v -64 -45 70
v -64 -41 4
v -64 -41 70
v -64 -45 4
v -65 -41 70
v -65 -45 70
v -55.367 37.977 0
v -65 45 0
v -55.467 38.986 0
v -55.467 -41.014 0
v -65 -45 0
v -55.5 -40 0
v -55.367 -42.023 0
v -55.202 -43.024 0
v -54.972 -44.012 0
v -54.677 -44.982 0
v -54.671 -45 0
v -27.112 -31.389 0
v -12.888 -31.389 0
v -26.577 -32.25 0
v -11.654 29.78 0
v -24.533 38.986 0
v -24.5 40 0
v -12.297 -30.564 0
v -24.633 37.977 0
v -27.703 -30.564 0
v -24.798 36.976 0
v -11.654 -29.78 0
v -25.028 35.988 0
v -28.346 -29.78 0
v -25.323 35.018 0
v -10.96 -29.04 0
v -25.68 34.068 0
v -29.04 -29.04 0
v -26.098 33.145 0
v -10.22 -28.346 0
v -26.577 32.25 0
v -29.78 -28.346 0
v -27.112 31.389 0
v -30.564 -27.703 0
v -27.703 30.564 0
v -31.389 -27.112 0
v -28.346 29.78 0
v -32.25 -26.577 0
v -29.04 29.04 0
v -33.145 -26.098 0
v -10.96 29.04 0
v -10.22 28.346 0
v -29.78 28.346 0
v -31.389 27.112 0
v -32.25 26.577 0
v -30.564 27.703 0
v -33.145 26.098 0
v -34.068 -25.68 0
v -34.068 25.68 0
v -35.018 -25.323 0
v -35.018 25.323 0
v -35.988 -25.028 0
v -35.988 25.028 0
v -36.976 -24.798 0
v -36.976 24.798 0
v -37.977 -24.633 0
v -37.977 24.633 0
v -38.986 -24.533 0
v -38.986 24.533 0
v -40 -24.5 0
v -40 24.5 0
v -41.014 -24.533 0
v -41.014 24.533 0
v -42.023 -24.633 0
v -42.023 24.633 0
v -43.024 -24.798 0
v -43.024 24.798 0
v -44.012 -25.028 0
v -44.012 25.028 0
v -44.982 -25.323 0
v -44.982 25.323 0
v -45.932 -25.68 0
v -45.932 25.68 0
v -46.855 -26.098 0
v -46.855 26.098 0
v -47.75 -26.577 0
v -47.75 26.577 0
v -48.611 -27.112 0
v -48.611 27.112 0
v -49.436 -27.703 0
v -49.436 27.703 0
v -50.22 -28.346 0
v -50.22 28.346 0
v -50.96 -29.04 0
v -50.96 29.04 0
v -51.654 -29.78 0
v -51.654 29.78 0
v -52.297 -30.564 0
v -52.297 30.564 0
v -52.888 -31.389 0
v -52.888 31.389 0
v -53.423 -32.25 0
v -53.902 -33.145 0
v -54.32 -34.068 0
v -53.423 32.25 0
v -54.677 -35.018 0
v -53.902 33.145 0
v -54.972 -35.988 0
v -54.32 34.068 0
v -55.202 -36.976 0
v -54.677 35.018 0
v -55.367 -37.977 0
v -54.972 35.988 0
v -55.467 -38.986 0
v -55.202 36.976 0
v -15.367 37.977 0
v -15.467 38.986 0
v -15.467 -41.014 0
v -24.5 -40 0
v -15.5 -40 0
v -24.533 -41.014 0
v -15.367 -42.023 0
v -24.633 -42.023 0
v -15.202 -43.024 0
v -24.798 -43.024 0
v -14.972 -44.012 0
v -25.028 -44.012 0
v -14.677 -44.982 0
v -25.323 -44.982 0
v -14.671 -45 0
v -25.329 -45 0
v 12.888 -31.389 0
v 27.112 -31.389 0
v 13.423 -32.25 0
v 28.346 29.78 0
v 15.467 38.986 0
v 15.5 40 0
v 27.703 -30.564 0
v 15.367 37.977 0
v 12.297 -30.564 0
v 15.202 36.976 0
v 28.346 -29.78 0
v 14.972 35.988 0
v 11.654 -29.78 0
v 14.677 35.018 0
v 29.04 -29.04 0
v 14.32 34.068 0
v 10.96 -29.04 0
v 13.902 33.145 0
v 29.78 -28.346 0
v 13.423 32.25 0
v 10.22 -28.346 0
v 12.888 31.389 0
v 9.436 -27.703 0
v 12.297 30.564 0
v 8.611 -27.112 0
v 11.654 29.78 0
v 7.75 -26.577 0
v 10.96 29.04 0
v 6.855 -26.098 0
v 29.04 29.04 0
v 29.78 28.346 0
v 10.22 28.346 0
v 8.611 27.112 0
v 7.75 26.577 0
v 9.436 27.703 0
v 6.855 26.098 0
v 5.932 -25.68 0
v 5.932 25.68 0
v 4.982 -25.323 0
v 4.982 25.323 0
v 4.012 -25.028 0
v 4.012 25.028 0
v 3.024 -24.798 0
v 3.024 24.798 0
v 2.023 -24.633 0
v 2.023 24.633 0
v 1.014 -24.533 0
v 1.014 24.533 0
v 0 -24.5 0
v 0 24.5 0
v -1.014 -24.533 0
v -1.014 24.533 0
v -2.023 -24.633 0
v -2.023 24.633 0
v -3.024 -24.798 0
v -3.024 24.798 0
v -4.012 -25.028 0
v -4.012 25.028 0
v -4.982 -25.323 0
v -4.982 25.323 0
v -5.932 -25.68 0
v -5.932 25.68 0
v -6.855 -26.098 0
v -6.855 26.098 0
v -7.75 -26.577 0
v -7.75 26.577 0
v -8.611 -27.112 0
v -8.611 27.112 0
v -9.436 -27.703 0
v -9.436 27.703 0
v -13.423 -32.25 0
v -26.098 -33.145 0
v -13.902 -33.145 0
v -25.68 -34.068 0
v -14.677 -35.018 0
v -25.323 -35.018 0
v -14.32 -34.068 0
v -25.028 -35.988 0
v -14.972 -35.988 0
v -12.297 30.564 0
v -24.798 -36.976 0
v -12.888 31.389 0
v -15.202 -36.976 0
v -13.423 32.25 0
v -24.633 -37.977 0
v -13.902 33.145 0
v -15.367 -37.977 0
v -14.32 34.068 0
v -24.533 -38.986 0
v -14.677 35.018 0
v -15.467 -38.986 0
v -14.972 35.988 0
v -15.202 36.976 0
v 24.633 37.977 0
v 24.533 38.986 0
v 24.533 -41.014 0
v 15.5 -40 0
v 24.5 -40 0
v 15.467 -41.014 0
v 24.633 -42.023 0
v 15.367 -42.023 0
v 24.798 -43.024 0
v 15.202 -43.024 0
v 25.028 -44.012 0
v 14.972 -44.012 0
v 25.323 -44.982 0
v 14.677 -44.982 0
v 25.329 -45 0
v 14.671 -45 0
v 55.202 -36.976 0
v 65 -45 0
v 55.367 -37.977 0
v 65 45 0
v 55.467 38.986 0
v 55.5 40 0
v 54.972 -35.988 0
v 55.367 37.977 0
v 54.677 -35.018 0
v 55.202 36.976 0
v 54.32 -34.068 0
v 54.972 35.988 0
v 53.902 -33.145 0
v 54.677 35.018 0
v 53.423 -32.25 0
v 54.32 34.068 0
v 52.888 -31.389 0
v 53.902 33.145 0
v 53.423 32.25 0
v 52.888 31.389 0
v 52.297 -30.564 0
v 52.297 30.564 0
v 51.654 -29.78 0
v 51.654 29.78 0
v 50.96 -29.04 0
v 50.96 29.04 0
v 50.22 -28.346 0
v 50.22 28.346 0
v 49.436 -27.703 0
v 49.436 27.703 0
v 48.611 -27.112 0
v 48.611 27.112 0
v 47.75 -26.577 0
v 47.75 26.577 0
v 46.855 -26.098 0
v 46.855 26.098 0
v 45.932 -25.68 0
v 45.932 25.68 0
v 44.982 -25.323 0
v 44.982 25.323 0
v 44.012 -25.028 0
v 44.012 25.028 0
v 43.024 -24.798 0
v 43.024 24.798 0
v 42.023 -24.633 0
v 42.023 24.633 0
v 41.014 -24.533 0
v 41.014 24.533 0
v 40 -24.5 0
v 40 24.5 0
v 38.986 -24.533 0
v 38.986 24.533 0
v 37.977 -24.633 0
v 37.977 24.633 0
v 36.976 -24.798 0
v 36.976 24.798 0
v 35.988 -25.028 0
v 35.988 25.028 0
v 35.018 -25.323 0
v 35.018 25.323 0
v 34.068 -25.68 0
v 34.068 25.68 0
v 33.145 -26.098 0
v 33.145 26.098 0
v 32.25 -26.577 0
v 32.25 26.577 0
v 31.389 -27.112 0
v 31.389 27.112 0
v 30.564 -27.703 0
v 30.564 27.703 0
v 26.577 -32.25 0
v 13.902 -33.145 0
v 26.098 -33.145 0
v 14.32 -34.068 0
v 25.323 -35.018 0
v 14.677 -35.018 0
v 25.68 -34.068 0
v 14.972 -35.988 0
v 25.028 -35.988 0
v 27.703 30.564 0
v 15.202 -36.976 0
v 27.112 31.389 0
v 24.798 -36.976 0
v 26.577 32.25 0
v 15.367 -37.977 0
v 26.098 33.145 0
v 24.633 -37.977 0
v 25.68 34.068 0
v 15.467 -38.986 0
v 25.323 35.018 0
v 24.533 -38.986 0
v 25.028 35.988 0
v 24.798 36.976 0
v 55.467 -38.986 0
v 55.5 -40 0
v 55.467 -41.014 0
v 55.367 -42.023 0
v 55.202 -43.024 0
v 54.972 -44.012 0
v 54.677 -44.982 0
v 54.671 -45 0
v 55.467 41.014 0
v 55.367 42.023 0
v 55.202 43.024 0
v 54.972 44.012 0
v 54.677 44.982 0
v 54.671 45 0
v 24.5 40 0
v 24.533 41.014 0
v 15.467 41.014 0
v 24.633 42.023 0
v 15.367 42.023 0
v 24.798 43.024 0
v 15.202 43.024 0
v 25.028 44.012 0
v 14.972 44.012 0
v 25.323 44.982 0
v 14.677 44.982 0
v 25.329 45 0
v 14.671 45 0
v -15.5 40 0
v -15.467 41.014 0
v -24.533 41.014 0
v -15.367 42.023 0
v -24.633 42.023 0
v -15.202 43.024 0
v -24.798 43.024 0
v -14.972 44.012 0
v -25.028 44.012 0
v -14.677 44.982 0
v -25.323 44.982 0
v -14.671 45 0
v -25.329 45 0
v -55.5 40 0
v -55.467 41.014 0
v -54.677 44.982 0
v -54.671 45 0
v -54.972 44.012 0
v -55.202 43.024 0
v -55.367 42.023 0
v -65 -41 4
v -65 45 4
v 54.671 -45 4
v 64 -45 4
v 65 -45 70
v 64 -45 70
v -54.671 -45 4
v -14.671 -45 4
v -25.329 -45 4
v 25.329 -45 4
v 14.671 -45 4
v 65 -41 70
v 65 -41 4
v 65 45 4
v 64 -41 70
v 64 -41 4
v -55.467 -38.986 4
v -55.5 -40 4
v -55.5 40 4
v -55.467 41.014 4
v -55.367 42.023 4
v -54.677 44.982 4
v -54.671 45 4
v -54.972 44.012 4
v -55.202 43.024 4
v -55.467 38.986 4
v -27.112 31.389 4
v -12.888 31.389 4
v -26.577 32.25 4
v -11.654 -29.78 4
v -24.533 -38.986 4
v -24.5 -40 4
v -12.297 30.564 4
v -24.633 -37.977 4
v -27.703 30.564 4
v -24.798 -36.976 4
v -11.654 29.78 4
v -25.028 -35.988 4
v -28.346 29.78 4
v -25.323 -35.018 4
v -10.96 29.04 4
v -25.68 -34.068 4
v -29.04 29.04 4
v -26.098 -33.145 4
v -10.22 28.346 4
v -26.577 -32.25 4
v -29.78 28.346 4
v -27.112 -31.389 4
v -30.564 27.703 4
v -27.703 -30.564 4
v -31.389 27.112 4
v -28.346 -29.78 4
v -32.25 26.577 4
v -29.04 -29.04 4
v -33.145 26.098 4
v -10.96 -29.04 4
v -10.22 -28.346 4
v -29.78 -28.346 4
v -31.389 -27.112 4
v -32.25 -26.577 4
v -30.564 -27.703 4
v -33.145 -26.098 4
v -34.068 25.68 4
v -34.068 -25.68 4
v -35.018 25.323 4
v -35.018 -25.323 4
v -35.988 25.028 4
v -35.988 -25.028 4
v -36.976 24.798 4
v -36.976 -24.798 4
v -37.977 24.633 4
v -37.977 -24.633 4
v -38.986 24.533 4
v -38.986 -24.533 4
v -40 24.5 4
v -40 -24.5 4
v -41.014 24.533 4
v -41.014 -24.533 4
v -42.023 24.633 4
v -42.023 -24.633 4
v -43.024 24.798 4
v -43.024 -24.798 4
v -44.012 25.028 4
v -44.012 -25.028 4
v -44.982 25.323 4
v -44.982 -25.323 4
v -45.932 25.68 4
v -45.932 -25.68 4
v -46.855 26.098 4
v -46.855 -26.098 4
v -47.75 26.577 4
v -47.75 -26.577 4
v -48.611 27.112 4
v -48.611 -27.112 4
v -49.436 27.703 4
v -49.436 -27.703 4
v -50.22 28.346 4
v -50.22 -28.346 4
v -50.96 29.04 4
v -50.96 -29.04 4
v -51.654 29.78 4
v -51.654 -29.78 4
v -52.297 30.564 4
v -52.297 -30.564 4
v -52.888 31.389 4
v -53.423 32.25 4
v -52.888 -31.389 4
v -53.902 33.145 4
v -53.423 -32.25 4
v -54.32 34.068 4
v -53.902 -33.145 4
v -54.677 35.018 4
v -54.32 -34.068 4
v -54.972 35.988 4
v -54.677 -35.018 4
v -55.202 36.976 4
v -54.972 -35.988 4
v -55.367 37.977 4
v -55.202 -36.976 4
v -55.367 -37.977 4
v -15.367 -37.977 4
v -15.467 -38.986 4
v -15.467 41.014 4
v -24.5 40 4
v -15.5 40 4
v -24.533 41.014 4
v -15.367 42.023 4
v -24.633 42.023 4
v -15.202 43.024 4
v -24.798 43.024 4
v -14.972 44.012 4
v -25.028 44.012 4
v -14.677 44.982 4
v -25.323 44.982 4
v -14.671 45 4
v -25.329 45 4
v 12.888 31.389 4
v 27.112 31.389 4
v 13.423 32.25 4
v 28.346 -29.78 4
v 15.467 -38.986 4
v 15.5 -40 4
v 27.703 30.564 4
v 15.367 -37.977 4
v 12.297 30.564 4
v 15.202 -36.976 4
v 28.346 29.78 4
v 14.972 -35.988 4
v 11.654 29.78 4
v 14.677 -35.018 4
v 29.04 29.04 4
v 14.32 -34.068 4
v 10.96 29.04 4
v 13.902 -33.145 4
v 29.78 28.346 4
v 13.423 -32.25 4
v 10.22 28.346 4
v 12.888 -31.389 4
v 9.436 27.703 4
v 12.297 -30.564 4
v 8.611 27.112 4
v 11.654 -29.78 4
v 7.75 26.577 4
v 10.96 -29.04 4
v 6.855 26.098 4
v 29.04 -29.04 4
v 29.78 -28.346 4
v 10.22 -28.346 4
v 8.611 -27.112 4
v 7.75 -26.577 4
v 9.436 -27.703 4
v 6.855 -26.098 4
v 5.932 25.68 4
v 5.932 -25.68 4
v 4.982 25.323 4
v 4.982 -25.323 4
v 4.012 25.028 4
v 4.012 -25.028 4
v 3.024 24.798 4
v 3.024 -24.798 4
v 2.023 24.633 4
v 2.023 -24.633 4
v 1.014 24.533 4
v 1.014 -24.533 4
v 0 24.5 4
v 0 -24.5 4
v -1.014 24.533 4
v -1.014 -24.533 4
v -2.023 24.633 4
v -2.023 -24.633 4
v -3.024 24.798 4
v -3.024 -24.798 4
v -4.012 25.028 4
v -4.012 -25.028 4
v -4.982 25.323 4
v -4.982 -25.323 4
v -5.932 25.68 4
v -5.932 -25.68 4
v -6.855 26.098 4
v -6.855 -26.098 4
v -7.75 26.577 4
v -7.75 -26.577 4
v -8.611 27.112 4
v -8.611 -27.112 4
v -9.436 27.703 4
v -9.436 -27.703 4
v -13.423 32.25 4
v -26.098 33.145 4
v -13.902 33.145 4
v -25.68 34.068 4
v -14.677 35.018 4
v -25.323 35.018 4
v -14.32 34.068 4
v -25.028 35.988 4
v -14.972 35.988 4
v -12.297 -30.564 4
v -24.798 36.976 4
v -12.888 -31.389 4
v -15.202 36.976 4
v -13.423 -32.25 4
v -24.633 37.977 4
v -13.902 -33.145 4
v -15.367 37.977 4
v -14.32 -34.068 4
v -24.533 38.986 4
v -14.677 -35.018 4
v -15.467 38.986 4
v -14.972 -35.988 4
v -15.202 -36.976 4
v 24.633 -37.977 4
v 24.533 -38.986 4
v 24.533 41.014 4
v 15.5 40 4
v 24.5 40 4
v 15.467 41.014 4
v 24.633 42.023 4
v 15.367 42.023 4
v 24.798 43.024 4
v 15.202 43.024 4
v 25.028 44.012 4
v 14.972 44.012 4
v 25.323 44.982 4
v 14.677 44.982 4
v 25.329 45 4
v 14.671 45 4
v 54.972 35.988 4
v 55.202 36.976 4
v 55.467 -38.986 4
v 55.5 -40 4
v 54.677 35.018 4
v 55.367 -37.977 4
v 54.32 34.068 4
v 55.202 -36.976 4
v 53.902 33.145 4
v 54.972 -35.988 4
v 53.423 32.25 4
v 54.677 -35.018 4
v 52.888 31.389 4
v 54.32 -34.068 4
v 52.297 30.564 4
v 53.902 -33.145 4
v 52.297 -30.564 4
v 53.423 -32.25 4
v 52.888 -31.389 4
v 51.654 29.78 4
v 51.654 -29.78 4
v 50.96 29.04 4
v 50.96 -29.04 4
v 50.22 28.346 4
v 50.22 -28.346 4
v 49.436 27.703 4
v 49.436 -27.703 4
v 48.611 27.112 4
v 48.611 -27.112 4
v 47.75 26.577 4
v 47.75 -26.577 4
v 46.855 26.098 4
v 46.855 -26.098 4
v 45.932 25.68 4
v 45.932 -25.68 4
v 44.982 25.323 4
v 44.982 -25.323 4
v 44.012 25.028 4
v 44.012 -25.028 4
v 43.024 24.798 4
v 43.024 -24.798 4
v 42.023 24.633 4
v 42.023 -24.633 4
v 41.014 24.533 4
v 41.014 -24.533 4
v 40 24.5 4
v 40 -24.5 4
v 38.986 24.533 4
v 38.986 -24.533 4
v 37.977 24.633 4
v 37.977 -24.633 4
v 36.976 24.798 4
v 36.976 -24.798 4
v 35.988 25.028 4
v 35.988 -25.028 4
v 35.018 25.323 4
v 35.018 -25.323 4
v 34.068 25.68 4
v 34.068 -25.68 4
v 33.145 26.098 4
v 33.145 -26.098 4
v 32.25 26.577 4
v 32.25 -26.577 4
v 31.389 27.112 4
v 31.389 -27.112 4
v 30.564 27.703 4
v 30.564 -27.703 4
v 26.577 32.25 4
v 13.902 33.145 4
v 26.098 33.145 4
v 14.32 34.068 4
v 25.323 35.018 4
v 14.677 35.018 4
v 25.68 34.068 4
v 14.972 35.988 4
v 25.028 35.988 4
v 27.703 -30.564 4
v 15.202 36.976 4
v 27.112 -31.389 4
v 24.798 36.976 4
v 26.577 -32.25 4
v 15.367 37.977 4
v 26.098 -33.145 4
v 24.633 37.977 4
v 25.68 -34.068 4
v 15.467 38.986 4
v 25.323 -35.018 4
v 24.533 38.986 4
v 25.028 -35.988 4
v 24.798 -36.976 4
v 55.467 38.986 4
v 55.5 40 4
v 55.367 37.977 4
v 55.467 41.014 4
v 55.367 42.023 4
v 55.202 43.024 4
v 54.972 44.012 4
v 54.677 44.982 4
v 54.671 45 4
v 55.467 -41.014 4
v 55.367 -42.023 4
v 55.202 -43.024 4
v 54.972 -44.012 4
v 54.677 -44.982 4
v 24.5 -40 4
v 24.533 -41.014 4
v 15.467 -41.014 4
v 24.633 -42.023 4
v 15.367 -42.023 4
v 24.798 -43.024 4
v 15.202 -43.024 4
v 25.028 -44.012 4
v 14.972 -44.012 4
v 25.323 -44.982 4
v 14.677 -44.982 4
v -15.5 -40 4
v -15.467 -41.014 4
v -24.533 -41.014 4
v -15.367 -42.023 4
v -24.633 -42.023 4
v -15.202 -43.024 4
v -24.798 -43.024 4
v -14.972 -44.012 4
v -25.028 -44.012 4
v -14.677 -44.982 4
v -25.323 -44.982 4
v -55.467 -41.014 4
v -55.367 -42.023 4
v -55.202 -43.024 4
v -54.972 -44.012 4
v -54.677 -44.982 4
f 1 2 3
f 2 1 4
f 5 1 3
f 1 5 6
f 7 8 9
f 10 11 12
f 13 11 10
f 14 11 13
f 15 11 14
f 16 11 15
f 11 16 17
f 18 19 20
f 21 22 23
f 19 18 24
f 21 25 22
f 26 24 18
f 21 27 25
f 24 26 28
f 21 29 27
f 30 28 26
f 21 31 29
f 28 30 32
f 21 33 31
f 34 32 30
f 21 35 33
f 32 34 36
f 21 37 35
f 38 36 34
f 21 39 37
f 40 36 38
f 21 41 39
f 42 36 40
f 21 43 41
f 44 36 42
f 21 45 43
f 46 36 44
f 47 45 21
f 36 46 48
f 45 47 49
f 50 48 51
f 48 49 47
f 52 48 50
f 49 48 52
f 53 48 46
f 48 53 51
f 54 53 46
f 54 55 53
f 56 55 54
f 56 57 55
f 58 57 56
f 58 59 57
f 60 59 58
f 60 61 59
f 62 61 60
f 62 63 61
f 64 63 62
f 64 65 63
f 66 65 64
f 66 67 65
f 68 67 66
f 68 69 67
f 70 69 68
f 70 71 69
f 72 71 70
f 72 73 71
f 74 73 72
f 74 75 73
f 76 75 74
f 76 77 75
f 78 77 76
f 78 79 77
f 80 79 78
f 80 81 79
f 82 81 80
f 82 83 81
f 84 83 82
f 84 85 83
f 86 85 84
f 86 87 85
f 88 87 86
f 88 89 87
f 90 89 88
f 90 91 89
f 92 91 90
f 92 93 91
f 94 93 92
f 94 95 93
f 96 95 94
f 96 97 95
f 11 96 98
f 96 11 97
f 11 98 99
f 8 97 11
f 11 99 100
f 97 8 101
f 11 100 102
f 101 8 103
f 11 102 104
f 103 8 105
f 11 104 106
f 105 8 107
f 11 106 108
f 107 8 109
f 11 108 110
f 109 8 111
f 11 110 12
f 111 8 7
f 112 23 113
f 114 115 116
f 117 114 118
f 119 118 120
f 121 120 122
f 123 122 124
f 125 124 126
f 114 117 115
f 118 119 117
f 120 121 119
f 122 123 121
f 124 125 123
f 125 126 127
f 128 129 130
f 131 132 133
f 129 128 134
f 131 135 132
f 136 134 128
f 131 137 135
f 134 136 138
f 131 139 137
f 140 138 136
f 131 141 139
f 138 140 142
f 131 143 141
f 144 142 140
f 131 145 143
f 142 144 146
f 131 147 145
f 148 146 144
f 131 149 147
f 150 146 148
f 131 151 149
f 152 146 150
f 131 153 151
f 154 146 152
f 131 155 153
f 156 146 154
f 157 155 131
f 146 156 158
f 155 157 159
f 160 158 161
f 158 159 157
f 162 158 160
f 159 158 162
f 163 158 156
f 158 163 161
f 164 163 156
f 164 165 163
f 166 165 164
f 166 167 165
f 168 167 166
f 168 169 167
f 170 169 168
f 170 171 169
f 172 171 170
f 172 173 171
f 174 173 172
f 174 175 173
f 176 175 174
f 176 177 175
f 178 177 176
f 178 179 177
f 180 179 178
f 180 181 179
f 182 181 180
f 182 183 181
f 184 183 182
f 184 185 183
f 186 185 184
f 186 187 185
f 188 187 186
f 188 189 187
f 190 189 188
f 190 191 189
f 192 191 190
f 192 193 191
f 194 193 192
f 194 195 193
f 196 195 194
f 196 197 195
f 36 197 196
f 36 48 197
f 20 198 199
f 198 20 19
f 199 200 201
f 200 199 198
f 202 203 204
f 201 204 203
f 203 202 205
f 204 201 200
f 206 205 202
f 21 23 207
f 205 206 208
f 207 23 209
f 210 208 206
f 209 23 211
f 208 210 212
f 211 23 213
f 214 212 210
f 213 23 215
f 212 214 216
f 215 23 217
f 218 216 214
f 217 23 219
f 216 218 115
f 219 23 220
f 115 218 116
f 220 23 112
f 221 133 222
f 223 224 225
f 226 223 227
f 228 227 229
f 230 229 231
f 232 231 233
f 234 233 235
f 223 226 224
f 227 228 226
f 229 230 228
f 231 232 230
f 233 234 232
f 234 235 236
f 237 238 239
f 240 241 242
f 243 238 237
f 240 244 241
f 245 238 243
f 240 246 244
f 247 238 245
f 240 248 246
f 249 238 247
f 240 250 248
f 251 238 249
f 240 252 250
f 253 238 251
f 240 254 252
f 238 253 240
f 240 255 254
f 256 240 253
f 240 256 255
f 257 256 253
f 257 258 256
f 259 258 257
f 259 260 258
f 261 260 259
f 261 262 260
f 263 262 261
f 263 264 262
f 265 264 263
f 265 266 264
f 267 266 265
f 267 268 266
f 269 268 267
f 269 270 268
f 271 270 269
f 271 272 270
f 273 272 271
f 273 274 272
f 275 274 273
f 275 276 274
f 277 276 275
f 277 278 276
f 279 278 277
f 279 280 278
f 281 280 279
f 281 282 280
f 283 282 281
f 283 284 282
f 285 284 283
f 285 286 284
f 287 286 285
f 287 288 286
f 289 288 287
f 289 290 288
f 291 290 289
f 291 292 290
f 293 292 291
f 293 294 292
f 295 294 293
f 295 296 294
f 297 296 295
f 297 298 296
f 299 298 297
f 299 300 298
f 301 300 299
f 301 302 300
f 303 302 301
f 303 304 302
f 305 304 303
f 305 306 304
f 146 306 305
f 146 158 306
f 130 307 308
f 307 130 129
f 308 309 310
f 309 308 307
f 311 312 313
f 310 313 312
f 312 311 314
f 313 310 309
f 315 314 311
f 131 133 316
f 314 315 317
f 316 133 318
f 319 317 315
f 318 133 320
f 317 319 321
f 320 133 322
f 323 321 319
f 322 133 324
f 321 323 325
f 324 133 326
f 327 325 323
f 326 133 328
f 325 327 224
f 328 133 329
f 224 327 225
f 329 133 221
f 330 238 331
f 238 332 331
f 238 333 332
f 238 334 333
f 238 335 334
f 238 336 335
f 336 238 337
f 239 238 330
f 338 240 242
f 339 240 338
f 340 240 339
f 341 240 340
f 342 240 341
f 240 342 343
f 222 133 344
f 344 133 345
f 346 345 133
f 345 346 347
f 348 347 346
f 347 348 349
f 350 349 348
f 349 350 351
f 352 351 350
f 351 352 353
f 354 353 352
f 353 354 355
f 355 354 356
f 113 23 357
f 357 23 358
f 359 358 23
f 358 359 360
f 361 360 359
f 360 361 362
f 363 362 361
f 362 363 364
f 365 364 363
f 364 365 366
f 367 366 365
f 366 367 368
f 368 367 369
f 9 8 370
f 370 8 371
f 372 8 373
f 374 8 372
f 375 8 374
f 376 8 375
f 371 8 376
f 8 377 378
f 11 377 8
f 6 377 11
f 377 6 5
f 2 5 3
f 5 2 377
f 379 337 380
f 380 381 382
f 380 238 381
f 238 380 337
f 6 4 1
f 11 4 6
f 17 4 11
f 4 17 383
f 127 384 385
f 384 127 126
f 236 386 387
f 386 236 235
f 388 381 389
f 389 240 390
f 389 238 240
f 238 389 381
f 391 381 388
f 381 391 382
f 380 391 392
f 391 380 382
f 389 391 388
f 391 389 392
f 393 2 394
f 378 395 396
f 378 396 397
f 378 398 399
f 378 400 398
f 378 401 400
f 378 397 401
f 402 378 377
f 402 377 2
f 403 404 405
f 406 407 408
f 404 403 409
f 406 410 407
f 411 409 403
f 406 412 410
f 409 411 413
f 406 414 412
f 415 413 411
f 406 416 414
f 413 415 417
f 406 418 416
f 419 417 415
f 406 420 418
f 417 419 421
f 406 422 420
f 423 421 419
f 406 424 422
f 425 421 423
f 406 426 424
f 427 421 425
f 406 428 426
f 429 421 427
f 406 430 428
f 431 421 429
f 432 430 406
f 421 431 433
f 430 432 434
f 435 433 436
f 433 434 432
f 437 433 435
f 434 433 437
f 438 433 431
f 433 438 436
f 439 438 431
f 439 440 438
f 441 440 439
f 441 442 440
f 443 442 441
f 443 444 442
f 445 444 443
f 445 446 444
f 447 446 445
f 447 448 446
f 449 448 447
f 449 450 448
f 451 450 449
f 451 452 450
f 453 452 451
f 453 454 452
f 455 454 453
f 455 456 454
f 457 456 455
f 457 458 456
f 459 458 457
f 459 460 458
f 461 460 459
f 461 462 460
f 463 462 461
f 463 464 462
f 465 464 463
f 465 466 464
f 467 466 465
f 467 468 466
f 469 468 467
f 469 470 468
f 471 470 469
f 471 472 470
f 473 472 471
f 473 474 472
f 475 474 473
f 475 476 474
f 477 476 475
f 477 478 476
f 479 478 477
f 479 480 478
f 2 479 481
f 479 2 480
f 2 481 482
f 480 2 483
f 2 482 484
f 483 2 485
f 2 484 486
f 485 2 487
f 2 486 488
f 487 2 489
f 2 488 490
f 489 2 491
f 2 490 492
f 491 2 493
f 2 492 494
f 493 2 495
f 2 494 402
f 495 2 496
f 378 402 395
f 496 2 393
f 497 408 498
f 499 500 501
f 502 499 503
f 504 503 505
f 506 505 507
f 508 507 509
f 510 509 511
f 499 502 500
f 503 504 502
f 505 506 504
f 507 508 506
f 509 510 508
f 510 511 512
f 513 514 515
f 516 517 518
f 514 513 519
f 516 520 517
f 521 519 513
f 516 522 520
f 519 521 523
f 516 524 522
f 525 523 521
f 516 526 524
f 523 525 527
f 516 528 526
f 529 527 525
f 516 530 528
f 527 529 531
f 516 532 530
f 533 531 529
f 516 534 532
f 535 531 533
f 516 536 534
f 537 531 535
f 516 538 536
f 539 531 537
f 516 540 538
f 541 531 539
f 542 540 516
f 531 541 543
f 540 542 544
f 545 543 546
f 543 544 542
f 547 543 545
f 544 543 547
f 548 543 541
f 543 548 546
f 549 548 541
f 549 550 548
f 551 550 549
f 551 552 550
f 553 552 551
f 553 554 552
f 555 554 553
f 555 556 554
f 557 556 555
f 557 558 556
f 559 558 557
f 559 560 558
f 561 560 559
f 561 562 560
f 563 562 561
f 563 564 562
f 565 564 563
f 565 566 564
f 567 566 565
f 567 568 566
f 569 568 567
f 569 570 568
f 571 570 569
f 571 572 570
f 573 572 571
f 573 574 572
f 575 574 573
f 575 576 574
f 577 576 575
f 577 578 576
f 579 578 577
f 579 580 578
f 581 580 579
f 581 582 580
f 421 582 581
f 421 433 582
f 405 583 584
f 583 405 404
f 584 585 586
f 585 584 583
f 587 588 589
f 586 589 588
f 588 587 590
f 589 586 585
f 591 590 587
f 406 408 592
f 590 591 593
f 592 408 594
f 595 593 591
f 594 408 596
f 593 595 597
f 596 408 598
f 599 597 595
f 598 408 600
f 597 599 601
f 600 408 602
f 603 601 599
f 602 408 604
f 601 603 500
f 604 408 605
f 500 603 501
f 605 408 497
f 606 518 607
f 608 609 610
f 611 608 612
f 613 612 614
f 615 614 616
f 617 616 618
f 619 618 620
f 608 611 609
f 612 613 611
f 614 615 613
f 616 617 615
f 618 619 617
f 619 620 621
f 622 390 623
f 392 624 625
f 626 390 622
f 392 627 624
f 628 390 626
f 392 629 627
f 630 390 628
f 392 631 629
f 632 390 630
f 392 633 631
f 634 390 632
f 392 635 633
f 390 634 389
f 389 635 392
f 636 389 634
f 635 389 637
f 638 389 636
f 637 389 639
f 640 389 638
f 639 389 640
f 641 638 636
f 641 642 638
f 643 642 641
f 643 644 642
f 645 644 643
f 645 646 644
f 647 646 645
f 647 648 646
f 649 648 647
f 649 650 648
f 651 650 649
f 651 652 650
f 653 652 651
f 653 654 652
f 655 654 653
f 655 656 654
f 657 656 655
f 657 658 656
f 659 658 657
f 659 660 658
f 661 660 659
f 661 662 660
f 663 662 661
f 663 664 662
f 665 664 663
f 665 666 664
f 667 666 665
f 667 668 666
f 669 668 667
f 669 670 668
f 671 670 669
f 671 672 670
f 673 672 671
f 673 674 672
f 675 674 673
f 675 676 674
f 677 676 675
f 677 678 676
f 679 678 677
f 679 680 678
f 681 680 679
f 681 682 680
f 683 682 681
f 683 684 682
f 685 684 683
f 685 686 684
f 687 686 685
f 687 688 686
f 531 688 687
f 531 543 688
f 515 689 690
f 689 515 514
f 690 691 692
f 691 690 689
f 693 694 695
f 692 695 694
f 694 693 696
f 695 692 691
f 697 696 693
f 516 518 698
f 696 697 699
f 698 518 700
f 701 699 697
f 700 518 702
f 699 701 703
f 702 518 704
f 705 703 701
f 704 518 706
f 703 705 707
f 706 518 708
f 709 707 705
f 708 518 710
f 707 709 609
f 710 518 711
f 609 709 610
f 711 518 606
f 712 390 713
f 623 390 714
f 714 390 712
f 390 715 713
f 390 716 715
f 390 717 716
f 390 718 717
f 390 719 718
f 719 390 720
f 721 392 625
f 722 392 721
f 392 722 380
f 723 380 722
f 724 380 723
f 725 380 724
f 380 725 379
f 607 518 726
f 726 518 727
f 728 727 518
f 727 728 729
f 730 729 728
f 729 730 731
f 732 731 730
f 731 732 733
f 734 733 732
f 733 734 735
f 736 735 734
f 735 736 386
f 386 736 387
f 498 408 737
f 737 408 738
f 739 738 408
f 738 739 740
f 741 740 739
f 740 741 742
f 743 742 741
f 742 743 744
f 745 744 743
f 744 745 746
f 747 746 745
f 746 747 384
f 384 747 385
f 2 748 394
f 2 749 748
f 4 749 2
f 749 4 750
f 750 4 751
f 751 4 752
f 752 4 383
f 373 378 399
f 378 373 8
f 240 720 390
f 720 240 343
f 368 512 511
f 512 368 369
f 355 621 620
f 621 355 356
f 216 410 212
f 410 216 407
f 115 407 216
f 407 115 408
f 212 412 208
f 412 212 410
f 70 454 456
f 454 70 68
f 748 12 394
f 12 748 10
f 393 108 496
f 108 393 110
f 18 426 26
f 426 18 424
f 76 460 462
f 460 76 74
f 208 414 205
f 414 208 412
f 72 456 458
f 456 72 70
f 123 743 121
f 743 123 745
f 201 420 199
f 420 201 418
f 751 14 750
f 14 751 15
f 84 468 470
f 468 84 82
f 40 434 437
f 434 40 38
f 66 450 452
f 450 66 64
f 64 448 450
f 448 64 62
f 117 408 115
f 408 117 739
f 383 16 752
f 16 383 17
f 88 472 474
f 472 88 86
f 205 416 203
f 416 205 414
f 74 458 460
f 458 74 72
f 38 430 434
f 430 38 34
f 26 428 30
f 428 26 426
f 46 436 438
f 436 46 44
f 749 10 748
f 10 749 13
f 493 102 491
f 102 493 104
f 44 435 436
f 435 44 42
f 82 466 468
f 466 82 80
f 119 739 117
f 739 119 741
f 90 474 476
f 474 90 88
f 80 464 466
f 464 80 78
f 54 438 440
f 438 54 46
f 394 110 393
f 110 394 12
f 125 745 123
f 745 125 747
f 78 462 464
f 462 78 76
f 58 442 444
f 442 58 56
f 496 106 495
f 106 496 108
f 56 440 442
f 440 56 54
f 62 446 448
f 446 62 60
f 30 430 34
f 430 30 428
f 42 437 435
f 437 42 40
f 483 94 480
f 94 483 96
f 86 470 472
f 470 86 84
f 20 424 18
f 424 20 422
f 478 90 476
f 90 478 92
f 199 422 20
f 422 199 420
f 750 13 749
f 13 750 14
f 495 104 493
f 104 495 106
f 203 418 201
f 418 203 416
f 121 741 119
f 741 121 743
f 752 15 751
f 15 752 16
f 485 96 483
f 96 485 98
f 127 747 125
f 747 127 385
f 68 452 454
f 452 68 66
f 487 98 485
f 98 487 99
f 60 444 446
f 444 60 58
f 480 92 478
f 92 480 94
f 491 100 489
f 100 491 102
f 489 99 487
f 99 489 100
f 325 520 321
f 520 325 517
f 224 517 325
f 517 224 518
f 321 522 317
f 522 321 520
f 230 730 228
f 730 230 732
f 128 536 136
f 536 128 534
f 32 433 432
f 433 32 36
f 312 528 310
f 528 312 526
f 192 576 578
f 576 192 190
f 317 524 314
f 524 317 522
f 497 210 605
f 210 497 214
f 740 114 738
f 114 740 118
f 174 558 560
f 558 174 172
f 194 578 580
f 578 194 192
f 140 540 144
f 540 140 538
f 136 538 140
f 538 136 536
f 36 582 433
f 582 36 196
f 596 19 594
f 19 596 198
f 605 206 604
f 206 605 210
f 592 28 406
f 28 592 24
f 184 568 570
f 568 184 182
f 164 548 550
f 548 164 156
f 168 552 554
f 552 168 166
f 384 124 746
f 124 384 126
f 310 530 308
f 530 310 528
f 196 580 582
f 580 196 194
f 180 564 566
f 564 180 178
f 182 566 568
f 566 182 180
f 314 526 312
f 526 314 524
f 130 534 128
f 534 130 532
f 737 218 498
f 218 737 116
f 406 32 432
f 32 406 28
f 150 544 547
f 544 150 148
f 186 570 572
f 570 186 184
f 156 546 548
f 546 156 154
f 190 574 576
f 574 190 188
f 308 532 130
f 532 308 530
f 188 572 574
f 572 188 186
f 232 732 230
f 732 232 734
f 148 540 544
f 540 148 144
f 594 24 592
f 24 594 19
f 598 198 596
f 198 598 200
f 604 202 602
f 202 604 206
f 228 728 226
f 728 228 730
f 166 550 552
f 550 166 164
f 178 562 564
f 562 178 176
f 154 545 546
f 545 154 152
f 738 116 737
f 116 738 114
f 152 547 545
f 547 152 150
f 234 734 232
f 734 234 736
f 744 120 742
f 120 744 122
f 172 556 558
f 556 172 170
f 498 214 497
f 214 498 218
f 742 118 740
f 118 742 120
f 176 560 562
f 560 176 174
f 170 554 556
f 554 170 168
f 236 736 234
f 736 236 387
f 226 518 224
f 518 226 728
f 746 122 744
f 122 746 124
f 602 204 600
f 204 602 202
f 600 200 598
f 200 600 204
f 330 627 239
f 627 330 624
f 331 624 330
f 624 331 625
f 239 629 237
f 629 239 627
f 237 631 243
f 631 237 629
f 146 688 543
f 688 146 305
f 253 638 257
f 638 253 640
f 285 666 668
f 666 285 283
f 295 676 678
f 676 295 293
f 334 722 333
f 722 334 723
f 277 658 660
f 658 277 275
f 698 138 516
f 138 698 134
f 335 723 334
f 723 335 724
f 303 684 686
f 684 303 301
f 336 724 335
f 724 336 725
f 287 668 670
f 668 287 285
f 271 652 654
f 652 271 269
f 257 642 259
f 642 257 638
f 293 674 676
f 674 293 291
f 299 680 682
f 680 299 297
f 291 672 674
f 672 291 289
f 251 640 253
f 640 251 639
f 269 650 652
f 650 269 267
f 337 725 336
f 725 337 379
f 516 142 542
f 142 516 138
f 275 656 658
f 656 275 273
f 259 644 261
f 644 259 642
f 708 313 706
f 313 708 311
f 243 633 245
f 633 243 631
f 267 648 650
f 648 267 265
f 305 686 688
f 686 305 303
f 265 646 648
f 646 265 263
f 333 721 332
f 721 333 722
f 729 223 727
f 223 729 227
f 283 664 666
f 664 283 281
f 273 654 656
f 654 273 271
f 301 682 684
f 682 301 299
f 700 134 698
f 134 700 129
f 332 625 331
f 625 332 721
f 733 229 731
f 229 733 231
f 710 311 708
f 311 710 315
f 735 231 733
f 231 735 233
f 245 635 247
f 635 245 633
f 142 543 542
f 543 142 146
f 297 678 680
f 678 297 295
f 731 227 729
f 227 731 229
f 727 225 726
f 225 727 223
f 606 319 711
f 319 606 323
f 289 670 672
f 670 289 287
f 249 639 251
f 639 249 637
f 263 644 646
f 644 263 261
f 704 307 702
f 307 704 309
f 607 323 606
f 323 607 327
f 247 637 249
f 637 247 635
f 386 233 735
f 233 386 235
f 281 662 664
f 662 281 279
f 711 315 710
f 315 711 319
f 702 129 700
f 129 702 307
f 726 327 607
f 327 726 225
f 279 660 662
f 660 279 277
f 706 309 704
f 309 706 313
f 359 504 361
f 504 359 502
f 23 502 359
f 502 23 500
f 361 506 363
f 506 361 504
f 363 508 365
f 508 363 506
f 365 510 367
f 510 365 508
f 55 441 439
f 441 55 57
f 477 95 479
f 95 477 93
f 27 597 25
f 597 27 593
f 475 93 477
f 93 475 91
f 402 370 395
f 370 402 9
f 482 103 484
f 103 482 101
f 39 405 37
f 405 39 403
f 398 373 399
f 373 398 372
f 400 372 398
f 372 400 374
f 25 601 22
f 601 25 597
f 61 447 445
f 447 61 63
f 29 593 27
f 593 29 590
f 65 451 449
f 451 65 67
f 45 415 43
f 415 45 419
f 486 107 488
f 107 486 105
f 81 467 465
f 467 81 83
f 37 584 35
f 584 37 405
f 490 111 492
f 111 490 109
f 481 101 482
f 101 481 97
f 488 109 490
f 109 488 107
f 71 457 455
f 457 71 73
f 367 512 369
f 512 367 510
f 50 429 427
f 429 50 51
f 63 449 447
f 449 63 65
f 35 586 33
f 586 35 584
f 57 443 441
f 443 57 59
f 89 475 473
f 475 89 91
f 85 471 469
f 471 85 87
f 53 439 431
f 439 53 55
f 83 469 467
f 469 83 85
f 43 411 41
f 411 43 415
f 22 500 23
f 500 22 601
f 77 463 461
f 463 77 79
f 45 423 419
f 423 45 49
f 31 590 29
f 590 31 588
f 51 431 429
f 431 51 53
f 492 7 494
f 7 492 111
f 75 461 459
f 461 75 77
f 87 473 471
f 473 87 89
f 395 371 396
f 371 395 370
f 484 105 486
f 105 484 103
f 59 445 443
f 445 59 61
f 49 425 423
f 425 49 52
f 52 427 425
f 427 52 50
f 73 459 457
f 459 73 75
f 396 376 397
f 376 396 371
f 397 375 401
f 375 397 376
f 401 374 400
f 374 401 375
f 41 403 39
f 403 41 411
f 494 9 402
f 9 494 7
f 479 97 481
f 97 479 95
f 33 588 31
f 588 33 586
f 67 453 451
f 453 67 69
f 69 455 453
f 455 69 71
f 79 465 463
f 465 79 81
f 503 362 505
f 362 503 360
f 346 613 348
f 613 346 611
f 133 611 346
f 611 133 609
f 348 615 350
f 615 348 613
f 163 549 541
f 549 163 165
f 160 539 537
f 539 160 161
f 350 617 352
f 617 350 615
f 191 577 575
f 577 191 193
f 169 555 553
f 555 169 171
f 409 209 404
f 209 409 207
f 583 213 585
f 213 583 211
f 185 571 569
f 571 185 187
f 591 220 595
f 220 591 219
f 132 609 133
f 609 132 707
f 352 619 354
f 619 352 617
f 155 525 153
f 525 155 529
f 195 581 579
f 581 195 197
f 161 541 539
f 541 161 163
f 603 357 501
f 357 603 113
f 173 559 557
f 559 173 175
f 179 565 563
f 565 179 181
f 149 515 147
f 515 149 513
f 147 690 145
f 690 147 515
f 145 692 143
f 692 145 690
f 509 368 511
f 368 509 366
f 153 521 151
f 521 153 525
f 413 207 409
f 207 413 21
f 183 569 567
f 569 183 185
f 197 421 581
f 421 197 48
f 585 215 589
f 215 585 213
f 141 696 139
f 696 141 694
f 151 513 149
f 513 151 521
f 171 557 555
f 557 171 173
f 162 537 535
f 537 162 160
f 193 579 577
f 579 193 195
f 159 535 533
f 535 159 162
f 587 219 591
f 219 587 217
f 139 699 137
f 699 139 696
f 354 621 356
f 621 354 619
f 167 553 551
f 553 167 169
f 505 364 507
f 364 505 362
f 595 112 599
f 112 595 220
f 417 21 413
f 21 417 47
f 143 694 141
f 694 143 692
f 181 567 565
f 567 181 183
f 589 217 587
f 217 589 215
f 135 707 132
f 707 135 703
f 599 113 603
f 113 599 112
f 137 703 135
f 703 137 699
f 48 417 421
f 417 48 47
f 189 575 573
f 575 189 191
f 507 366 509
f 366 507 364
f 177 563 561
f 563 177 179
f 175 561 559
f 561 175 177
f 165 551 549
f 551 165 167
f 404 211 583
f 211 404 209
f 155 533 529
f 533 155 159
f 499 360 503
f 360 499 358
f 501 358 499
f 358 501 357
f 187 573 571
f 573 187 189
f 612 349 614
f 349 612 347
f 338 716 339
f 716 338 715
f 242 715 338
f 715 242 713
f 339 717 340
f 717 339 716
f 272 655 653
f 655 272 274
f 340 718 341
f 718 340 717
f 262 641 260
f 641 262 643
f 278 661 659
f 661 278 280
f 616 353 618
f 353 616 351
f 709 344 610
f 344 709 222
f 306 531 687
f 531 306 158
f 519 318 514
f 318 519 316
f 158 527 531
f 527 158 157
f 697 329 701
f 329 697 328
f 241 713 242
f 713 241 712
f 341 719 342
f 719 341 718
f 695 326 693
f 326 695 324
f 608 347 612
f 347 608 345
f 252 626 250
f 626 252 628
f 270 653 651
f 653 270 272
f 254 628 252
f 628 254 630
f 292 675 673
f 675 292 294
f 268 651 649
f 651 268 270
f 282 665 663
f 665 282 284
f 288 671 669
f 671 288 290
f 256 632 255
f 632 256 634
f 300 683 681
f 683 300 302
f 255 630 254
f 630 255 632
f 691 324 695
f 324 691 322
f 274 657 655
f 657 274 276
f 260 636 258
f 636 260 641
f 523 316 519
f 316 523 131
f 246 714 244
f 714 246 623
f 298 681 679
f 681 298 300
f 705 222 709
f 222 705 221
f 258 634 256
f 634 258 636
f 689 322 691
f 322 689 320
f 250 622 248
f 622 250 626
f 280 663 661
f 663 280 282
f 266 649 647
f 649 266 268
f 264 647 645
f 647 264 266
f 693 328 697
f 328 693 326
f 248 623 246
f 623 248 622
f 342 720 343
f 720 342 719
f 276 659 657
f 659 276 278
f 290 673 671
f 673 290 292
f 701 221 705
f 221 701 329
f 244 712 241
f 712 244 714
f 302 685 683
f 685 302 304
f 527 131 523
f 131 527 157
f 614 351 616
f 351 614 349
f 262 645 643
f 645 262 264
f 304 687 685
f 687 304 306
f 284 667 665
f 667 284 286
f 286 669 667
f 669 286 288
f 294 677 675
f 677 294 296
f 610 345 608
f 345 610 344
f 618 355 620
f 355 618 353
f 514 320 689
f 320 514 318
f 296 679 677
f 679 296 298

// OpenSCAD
// Rack for six 50 mL conical (Falcon-type) tubes
// Print orientation: flat plate on bed, holes facing up
// After printing: flip over so the plate is down and the walls support the tubes

// ---------- Parameters ----------
tube_d      = 30.5;   // tube outer diameter
hole_d      = tube_d + 0.5;  // through-hole diameter (slightly larger)
row_pitch   = 40;     // centre-to-centre spacing along X and Y
plate_x     = 130;    // plate length (X)
plate_y     = 90;     // plate width (Y)
plate_t     = 4;      // plate thickness (Z)
wall_h      = 66;     // wall height above plate (z = 4 to 70)
eps         = 0.5;    // cutter overshoot past faces

$fn = 96;

// ---------- Model ----------
difference() {
    union() {
        // Base plate
        translate([-plate_x/2, -plate_y/2, 0])
            cube([plate_x, plate_y, plate_t]);

        // Two long-edge walls (along X), flush with the plate
        for (sx = [-1, 1])
            translate([sx > 0 ? plate_x/2 - 1 : -plate_x/2,
                       -plate_y/2, 0])
                cube([plate_x - sx > 0 ? 1 : plate_x,
                      plate_t, wall_h + plate_t]);
    }

    // Six through-holes: 2 rows (along Y) of 3 (along X)
    for (i = [-1, 1])
        for (j = [-1, 0, 1])
            translate([j * row_pitch, i * row_pitch, -eps])
                cylinder(d = hole_d, h = plate_t + 2*eps);
}
